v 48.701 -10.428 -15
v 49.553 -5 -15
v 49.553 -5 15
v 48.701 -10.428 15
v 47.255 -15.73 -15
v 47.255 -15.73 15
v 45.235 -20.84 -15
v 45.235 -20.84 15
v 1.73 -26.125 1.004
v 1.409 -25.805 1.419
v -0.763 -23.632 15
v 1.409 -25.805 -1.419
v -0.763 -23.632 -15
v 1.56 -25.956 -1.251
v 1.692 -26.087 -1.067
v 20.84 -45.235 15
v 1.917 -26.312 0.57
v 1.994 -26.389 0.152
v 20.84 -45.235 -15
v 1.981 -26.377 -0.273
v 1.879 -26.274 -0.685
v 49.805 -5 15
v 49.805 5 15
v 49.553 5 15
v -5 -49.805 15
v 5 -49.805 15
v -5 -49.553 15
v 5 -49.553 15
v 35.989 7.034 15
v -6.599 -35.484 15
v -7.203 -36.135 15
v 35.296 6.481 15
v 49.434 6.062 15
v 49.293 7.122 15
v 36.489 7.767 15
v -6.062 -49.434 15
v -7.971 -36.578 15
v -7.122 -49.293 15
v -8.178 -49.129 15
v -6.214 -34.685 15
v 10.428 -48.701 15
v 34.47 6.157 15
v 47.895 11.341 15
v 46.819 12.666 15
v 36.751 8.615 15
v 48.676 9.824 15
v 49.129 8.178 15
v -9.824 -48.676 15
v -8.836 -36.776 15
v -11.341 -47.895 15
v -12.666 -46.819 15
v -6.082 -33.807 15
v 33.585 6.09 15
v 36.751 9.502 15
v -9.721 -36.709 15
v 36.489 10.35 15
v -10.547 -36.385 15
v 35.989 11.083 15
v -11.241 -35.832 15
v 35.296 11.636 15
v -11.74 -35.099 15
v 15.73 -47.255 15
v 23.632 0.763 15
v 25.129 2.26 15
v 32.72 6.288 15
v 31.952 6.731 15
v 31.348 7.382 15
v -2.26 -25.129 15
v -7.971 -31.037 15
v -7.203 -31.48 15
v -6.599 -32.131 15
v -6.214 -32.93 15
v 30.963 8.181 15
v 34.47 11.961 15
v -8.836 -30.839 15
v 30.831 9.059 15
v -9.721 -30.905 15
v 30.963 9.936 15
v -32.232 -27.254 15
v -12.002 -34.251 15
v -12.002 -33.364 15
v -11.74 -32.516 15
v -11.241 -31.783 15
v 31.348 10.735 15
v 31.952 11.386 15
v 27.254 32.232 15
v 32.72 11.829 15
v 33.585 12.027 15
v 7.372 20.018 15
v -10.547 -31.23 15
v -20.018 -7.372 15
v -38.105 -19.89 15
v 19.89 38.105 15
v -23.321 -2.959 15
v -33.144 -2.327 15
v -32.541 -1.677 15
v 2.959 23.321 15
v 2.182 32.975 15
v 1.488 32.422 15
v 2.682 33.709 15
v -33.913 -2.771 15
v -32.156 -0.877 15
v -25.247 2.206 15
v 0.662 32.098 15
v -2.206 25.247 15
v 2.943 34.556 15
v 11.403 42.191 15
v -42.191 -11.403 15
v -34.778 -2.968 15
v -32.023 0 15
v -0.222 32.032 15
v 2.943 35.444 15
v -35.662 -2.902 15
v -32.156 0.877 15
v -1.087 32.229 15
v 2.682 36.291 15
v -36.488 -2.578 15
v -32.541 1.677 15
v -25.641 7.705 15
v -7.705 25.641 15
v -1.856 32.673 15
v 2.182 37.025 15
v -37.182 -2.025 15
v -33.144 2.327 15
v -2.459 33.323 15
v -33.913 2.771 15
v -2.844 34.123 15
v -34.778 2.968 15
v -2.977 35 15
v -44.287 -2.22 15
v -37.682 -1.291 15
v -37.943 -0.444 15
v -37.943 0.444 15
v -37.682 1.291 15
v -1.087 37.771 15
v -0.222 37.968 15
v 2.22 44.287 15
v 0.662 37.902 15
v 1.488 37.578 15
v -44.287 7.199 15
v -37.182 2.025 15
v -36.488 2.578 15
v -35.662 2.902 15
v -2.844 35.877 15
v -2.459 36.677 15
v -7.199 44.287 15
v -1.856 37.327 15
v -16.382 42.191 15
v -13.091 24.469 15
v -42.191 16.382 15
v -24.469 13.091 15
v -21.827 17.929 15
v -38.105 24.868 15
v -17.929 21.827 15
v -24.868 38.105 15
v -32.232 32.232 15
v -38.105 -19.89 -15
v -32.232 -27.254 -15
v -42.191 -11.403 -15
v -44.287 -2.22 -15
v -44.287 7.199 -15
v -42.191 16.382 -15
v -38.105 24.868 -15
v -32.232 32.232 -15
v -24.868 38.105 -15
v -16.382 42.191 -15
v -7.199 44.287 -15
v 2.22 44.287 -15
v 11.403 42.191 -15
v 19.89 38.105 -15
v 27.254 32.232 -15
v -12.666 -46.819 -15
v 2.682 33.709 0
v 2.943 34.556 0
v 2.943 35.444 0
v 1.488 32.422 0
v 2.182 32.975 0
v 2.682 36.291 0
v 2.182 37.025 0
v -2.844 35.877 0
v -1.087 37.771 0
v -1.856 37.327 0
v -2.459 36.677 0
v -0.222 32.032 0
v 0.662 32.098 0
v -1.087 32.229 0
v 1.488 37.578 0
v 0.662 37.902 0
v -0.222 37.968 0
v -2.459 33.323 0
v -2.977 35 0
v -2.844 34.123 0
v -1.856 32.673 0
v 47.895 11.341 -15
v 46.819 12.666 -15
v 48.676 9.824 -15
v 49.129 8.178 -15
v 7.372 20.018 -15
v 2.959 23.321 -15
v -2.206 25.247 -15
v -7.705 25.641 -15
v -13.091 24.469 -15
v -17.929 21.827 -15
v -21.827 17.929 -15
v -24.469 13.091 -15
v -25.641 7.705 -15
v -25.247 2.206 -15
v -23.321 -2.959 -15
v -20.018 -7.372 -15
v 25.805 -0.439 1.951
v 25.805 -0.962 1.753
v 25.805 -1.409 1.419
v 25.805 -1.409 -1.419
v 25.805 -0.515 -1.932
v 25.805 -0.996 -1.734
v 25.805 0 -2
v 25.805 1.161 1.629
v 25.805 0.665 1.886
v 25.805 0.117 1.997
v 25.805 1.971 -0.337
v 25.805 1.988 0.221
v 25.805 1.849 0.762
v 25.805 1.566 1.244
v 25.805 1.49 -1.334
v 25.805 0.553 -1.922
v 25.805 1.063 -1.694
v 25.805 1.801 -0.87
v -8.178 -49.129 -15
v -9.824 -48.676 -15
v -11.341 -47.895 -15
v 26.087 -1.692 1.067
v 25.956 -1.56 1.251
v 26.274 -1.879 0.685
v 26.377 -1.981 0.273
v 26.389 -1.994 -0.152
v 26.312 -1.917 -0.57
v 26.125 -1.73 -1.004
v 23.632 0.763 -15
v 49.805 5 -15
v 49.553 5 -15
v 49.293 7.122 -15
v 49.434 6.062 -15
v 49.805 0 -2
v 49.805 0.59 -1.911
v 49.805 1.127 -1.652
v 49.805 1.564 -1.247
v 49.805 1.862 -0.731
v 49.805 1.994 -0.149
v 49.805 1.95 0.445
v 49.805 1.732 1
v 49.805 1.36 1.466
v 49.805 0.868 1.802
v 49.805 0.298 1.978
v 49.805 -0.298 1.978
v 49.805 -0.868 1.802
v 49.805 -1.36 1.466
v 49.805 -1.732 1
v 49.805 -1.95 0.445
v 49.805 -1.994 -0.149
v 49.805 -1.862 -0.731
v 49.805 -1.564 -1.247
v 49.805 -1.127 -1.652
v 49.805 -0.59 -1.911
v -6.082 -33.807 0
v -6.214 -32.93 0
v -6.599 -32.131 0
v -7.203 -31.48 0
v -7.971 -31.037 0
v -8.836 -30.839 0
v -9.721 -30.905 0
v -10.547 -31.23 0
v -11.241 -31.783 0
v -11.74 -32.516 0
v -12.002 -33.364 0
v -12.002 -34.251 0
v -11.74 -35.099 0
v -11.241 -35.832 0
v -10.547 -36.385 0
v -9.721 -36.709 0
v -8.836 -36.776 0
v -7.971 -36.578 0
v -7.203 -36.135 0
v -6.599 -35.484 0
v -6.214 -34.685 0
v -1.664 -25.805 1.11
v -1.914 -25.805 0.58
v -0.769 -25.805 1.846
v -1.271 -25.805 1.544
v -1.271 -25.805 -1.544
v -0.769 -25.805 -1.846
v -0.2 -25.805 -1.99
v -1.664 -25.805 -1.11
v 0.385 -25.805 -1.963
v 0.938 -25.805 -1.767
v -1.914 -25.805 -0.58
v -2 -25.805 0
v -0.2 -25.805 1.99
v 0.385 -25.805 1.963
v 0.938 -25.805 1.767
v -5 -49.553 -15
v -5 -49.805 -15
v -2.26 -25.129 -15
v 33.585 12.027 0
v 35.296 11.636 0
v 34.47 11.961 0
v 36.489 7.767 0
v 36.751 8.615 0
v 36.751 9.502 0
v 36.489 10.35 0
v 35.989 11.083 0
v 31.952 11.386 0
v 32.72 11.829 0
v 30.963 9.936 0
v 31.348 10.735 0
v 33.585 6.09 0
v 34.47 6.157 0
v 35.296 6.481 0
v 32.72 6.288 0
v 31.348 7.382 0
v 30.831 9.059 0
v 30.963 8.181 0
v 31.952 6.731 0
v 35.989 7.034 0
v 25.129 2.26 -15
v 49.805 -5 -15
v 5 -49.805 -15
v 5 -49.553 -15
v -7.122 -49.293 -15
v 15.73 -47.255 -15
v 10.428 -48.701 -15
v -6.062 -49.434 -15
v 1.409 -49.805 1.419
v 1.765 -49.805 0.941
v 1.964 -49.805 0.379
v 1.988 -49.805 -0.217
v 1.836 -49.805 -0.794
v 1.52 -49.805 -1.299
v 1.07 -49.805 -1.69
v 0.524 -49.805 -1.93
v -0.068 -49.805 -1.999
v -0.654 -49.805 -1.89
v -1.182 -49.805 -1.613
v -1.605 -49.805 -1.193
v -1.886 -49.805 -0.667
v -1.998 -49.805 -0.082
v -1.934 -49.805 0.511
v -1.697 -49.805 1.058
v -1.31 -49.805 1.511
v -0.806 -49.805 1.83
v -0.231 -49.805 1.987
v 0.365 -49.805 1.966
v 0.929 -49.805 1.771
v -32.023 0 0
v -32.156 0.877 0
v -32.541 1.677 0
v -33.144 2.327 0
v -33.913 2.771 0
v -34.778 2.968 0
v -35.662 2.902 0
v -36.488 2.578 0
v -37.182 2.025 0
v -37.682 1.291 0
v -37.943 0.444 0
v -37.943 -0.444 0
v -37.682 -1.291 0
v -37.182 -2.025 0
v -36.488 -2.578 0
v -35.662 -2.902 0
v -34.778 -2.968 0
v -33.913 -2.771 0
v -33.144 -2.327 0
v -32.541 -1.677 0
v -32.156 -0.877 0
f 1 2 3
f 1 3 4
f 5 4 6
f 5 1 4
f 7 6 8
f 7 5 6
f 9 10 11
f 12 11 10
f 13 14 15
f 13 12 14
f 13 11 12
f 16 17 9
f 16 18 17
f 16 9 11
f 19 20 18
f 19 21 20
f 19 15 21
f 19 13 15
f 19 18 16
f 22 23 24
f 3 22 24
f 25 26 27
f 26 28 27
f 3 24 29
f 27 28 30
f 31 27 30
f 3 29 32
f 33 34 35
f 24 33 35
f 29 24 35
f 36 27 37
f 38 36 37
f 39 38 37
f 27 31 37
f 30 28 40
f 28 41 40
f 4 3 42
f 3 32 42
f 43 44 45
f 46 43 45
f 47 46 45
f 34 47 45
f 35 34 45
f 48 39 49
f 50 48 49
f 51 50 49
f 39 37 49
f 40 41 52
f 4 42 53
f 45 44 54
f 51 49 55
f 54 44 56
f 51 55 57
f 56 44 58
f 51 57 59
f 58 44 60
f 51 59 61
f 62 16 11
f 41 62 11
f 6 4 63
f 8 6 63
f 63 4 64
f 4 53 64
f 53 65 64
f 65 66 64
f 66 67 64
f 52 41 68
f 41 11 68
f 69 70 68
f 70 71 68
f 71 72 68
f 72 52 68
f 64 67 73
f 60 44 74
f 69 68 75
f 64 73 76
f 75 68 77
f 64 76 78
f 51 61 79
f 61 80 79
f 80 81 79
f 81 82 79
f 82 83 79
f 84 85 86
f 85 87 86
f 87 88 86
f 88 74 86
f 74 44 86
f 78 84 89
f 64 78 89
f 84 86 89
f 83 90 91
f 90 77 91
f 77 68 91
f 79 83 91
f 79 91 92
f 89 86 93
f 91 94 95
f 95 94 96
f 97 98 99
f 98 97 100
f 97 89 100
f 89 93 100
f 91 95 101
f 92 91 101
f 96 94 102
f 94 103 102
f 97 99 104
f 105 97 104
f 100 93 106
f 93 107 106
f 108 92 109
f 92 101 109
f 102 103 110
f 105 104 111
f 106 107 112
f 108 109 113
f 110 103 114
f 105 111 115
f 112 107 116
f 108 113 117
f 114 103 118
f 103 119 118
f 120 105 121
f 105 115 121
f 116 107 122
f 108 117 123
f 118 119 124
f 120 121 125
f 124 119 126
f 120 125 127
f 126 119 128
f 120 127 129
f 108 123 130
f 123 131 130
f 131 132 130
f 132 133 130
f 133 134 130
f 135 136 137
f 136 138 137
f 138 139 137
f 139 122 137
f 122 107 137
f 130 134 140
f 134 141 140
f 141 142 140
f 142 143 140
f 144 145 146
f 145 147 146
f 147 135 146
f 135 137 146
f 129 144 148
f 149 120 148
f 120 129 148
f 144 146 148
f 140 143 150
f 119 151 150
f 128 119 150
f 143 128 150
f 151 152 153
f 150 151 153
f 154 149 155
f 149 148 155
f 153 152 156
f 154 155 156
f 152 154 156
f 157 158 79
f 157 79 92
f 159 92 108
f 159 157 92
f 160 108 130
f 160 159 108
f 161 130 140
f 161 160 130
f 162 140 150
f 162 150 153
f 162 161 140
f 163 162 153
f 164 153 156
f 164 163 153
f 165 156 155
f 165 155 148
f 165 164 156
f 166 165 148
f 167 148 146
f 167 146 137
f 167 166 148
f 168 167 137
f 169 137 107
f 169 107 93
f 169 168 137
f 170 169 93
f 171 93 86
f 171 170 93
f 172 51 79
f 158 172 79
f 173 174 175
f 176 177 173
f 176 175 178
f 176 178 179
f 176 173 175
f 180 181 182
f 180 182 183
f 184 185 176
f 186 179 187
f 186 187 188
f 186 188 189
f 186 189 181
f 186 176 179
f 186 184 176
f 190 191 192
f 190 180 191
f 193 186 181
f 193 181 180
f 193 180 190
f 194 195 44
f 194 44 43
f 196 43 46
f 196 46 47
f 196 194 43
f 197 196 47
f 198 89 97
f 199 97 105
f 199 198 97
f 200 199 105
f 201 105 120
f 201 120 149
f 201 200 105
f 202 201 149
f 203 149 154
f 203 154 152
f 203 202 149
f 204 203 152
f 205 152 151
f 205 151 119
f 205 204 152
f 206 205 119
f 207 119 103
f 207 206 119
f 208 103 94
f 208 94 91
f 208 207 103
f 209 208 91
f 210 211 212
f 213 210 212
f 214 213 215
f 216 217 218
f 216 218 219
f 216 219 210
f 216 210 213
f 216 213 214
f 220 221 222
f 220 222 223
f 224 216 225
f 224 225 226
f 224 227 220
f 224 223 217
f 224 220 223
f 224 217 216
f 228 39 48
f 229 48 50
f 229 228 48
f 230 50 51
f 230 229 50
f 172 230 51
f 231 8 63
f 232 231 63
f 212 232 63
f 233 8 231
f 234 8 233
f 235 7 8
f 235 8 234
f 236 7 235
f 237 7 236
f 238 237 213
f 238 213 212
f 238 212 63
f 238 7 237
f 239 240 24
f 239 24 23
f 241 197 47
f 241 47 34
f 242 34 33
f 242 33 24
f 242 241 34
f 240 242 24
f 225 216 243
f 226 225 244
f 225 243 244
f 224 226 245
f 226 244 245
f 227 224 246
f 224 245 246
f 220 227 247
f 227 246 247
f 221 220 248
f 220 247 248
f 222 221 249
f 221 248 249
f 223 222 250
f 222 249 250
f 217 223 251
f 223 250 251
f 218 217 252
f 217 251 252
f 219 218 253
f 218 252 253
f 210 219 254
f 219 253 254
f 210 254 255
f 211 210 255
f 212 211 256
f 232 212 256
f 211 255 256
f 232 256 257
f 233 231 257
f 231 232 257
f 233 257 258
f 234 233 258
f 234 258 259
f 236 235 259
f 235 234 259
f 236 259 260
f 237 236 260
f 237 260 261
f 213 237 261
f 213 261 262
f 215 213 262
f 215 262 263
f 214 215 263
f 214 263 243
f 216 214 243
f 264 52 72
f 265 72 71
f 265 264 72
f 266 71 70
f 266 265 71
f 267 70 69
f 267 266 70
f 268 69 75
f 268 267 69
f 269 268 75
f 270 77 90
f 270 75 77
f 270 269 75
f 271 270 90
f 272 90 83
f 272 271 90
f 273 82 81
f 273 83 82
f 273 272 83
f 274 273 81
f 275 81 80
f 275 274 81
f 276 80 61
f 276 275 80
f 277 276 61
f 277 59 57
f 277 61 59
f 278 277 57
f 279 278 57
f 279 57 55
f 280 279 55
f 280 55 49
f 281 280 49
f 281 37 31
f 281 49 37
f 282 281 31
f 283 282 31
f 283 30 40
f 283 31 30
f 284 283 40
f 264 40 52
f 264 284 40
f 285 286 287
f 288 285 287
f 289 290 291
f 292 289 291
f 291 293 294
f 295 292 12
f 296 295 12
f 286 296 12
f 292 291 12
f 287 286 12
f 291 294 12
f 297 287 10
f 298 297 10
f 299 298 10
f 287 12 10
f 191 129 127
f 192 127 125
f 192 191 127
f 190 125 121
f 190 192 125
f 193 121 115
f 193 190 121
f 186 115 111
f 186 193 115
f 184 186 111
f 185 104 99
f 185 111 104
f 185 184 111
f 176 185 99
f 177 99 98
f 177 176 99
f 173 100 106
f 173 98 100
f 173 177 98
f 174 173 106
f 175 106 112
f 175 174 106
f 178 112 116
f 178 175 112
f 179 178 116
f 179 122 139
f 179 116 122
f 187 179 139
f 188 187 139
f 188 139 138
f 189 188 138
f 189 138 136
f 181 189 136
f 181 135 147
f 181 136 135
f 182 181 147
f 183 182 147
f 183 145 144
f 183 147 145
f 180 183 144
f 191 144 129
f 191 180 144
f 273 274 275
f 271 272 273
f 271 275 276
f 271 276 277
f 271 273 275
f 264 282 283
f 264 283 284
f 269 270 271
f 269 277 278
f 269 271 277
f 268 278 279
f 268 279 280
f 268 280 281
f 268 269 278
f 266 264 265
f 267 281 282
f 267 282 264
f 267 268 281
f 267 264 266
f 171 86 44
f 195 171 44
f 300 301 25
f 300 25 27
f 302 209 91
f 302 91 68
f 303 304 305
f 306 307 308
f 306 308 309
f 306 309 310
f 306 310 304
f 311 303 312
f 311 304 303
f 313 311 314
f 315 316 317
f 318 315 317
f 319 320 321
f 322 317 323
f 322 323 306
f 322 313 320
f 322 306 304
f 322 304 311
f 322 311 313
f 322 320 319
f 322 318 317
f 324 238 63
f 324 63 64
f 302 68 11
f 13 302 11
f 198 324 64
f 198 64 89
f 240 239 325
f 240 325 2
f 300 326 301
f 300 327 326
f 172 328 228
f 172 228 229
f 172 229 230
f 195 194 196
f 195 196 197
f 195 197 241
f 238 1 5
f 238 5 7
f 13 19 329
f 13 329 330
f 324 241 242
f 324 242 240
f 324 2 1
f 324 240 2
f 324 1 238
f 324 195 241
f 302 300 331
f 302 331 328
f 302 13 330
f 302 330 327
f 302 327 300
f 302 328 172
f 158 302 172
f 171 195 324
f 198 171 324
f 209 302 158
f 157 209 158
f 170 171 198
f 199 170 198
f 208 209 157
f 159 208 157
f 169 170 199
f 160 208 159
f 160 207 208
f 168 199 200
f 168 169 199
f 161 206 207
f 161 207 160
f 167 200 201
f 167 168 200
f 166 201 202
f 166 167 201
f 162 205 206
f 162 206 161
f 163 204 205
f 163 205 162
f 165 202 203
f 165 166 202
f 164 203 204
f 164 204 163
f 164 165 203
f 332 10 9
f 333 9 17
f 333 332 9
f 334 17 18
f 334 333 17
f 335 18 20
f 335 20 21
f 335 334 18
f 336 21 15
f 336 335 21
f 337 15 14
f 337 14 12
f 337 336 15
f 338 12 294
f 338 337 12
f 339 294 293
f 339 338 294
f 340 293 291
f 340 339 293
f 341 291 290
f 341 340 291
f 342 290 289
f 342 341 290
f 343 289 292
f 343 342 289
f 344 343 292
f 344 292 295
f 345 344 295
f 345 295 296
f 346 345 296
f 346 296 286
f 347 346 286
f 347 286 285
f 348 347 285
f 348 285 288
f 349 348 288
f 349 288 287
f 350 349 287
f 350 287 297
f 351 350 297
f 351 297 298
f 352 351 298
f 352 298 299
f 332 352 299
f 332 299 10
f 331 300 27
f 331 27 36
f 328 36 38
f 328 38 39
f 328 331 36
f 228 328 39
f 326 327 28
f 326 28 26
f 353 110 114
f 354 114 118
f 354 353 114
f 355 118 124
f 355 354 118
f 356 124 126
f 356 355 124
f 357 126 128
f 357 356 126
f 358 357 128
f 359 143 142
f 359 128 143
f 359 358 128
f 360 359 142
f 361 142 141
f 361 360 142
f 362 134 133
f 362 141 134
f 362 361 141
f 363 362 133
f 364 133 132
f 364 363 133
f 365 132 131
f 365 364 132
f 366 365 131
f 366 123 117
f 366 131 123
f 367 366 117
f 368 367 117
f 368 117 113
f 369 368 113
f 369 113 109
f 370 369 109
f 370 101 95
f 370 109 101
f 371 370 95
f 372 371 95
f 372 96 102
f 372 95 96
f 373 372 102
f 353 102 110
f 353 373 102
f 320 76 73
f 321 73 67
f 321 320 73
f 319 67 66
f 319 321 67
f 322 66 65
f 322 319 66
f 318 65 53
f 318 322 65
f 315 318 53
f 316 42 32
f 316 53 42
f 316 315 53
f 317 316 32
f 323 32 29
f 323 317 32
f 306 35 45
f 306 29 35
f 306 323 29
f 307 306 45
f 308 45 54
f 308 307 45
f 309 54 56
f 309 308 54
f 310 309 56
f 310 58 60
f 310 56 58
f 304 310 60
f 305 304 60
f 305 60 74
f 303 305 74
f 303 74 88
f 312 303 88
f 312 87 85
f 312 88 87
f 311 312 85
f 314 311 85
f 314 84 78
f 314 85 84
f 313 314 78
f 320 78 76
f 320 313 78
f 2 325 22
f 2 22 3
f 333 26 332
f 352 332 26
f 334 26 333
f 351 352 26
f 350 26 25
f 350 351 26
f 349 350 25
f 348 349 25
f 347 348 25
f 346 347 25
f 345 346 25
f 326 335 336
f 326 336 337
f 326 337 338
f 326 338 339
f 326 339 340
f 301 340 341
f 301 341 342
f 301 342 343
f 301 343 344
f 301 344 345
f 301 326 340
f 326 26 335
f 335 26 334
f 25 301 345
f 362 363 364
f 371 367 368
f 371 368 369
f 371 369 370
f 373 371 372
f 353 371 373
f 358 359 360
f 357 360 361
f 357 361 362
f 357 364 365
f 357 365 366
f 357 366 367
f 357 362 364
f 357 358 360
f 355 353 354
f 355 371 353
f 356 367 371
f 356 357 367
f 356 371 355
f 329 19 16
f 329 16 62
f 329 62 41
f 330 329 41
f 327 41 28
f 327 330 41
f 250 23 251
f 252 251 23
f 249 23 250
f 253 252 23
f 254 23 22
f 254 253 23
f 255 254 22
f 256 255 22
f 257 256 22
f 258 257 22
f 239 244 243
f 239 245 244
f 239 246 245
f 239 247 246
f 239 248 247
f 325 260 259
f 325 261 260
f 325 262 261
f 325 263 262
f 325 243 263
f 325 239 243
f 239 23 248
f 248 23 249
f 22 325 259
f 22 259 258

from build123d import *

# Parameters (mm, degrees)
BOSS_EXTRUDE1_DEPTH      = 15
BOSS_EXTRUDE1_DEPTH_BACK = 15
SKETCH2_R                = 2
CUT_EXTRUDE1_DEPTH       = 24
SKETCH3_R                = 2
CUT_EXTRUDE2_DEPTH       = 24
SKETCH6_R                = 2.9765625
CUT_EXTRUDE4_DEPTH       = 73.013836648


with BuildPart() as part:
    # Sketch1 → Boss-Extrude1 (new, two sides: drawn at the far end of the back side and taken through both)
    with BuildSketch(Plane.XY.offset(-BOSS_EXTRUDE1_DEPTH_BACK)):
        with BuildLine():
            Line((5, -49.80458146), (-5, -49.80458146))
            Line((-5, -49.80458146), (-5, -49.552964941))
            ThreePointArc((-5, -49.552964941), (-6.59229192, -49.366365287), (-8.177753112, -49.128613744))
            ThreePointArc((-8.177753112, -49.128613744), (-10.602641493, -48.324877157), (-12.666415249, -46.819249696))
            Line((-12.666415249, -46.819249696), (-32.231963719, -27.253701226))
            ThreePointArc((-32.231963719, -27.253701226), (-32.231963719, 32.231963719), (27.253701226, 32.231963719))
            Line((27.253701226, 32.231963719), (46.819249696, 12.666415249))
            ThreePointArc((46.819249696, 12.666415249), (48.324877157, 10.602641493), (49.128613744, 8.177753112))
            ThreePointArc((49.128613744, 8.177753112), (49.366365287, 6.59229192), (49.552964941, 5))
            Line((49.552964941, 5), (49.80458146, 5))
            Line((49.80458146, 5), (49.80458146, -5))
            Line((49.80458146, -5), (49.552964941, -5))
            ThreePointArc((49.552964941, -5), (48.051135901, -13.099033286), (45.234948365, -20.839764414))
            Line((45.234948365, -20.839764414), (23.63175062, 0.763433331))
            Line((23.63175062, 0.763433331), (25.128673235, 2.260355947))
            Line((25.128673235, 2.260355947), (7.371511647, 20.017517534))
            ThreePointArc((7.371511647, 20.017517534), (-20.017517534, 20.017517534), (-20.017517534, -7.371511647))
            Line((-20.017517534, -7.371511647), (-2.260355947, -25.128673235))
            Line((-2.260355947, -25.128673235), (-0.763433331, -23.63175062))
            Line((-0.763433331, -23.63175062), (20.839764414, -45.234948365))
            ThreePointArc((20.839764414, -45.234948365), (13.099033286, -48.051135901), (5, -49.552964941))
            Line((5, -49.552964941), (5, -49.80458146))
        make_face()
    extrude(amount=BOSS_EXTRUDE1_DEPTH + BOSS_EXTRUDE1_DEPTH_BACK)

    # Sketch2 → Cut-Extrude1 (cut)
    with BuildSketch(Plane(origin=(0, -49.80458146, 0), x_dir=(1, 0, 0), z_dir=(0, 1, 0))):
        Circle(SKETCH2_R)
    extrude(amount=CUT_EXTRUDE1_DEPTH, mode=Mode.SUBTRACT)

    # Sketch3 → Cut-Extrude2 (cut)
    with BuildSketch(Plane(origin=(49.80458146, 0, 0), x_dir=(0, 0, -1), z_dir=(1, 0, 0))):
        Circle(SKETCH3_R)
    extrude(amount=-CUT_EXTRUDE2_DEPTH, mode=Mode.SUBTRACT)

    # Sketch6 → Cut-Extrude4 (cut, through all)
    with BuildSketch(Plane.XY):
        with Locations((-9.058666579, -33.80740392)):
            Circle(SKETCH6_R)
        with Locations((-35, 0)):
            Circle(SKETCH6_R)
        with Locations((0, 35)):
            Circle(SKETCH6_R)
        with Locations((33.80740392, 9.058666579)):
            Circle(SKETCH6_R)
    extrude(amount=CUT_EXTRUDE4_DEPTH, mode=Mode.SUBTRACT)


solid = part.part
